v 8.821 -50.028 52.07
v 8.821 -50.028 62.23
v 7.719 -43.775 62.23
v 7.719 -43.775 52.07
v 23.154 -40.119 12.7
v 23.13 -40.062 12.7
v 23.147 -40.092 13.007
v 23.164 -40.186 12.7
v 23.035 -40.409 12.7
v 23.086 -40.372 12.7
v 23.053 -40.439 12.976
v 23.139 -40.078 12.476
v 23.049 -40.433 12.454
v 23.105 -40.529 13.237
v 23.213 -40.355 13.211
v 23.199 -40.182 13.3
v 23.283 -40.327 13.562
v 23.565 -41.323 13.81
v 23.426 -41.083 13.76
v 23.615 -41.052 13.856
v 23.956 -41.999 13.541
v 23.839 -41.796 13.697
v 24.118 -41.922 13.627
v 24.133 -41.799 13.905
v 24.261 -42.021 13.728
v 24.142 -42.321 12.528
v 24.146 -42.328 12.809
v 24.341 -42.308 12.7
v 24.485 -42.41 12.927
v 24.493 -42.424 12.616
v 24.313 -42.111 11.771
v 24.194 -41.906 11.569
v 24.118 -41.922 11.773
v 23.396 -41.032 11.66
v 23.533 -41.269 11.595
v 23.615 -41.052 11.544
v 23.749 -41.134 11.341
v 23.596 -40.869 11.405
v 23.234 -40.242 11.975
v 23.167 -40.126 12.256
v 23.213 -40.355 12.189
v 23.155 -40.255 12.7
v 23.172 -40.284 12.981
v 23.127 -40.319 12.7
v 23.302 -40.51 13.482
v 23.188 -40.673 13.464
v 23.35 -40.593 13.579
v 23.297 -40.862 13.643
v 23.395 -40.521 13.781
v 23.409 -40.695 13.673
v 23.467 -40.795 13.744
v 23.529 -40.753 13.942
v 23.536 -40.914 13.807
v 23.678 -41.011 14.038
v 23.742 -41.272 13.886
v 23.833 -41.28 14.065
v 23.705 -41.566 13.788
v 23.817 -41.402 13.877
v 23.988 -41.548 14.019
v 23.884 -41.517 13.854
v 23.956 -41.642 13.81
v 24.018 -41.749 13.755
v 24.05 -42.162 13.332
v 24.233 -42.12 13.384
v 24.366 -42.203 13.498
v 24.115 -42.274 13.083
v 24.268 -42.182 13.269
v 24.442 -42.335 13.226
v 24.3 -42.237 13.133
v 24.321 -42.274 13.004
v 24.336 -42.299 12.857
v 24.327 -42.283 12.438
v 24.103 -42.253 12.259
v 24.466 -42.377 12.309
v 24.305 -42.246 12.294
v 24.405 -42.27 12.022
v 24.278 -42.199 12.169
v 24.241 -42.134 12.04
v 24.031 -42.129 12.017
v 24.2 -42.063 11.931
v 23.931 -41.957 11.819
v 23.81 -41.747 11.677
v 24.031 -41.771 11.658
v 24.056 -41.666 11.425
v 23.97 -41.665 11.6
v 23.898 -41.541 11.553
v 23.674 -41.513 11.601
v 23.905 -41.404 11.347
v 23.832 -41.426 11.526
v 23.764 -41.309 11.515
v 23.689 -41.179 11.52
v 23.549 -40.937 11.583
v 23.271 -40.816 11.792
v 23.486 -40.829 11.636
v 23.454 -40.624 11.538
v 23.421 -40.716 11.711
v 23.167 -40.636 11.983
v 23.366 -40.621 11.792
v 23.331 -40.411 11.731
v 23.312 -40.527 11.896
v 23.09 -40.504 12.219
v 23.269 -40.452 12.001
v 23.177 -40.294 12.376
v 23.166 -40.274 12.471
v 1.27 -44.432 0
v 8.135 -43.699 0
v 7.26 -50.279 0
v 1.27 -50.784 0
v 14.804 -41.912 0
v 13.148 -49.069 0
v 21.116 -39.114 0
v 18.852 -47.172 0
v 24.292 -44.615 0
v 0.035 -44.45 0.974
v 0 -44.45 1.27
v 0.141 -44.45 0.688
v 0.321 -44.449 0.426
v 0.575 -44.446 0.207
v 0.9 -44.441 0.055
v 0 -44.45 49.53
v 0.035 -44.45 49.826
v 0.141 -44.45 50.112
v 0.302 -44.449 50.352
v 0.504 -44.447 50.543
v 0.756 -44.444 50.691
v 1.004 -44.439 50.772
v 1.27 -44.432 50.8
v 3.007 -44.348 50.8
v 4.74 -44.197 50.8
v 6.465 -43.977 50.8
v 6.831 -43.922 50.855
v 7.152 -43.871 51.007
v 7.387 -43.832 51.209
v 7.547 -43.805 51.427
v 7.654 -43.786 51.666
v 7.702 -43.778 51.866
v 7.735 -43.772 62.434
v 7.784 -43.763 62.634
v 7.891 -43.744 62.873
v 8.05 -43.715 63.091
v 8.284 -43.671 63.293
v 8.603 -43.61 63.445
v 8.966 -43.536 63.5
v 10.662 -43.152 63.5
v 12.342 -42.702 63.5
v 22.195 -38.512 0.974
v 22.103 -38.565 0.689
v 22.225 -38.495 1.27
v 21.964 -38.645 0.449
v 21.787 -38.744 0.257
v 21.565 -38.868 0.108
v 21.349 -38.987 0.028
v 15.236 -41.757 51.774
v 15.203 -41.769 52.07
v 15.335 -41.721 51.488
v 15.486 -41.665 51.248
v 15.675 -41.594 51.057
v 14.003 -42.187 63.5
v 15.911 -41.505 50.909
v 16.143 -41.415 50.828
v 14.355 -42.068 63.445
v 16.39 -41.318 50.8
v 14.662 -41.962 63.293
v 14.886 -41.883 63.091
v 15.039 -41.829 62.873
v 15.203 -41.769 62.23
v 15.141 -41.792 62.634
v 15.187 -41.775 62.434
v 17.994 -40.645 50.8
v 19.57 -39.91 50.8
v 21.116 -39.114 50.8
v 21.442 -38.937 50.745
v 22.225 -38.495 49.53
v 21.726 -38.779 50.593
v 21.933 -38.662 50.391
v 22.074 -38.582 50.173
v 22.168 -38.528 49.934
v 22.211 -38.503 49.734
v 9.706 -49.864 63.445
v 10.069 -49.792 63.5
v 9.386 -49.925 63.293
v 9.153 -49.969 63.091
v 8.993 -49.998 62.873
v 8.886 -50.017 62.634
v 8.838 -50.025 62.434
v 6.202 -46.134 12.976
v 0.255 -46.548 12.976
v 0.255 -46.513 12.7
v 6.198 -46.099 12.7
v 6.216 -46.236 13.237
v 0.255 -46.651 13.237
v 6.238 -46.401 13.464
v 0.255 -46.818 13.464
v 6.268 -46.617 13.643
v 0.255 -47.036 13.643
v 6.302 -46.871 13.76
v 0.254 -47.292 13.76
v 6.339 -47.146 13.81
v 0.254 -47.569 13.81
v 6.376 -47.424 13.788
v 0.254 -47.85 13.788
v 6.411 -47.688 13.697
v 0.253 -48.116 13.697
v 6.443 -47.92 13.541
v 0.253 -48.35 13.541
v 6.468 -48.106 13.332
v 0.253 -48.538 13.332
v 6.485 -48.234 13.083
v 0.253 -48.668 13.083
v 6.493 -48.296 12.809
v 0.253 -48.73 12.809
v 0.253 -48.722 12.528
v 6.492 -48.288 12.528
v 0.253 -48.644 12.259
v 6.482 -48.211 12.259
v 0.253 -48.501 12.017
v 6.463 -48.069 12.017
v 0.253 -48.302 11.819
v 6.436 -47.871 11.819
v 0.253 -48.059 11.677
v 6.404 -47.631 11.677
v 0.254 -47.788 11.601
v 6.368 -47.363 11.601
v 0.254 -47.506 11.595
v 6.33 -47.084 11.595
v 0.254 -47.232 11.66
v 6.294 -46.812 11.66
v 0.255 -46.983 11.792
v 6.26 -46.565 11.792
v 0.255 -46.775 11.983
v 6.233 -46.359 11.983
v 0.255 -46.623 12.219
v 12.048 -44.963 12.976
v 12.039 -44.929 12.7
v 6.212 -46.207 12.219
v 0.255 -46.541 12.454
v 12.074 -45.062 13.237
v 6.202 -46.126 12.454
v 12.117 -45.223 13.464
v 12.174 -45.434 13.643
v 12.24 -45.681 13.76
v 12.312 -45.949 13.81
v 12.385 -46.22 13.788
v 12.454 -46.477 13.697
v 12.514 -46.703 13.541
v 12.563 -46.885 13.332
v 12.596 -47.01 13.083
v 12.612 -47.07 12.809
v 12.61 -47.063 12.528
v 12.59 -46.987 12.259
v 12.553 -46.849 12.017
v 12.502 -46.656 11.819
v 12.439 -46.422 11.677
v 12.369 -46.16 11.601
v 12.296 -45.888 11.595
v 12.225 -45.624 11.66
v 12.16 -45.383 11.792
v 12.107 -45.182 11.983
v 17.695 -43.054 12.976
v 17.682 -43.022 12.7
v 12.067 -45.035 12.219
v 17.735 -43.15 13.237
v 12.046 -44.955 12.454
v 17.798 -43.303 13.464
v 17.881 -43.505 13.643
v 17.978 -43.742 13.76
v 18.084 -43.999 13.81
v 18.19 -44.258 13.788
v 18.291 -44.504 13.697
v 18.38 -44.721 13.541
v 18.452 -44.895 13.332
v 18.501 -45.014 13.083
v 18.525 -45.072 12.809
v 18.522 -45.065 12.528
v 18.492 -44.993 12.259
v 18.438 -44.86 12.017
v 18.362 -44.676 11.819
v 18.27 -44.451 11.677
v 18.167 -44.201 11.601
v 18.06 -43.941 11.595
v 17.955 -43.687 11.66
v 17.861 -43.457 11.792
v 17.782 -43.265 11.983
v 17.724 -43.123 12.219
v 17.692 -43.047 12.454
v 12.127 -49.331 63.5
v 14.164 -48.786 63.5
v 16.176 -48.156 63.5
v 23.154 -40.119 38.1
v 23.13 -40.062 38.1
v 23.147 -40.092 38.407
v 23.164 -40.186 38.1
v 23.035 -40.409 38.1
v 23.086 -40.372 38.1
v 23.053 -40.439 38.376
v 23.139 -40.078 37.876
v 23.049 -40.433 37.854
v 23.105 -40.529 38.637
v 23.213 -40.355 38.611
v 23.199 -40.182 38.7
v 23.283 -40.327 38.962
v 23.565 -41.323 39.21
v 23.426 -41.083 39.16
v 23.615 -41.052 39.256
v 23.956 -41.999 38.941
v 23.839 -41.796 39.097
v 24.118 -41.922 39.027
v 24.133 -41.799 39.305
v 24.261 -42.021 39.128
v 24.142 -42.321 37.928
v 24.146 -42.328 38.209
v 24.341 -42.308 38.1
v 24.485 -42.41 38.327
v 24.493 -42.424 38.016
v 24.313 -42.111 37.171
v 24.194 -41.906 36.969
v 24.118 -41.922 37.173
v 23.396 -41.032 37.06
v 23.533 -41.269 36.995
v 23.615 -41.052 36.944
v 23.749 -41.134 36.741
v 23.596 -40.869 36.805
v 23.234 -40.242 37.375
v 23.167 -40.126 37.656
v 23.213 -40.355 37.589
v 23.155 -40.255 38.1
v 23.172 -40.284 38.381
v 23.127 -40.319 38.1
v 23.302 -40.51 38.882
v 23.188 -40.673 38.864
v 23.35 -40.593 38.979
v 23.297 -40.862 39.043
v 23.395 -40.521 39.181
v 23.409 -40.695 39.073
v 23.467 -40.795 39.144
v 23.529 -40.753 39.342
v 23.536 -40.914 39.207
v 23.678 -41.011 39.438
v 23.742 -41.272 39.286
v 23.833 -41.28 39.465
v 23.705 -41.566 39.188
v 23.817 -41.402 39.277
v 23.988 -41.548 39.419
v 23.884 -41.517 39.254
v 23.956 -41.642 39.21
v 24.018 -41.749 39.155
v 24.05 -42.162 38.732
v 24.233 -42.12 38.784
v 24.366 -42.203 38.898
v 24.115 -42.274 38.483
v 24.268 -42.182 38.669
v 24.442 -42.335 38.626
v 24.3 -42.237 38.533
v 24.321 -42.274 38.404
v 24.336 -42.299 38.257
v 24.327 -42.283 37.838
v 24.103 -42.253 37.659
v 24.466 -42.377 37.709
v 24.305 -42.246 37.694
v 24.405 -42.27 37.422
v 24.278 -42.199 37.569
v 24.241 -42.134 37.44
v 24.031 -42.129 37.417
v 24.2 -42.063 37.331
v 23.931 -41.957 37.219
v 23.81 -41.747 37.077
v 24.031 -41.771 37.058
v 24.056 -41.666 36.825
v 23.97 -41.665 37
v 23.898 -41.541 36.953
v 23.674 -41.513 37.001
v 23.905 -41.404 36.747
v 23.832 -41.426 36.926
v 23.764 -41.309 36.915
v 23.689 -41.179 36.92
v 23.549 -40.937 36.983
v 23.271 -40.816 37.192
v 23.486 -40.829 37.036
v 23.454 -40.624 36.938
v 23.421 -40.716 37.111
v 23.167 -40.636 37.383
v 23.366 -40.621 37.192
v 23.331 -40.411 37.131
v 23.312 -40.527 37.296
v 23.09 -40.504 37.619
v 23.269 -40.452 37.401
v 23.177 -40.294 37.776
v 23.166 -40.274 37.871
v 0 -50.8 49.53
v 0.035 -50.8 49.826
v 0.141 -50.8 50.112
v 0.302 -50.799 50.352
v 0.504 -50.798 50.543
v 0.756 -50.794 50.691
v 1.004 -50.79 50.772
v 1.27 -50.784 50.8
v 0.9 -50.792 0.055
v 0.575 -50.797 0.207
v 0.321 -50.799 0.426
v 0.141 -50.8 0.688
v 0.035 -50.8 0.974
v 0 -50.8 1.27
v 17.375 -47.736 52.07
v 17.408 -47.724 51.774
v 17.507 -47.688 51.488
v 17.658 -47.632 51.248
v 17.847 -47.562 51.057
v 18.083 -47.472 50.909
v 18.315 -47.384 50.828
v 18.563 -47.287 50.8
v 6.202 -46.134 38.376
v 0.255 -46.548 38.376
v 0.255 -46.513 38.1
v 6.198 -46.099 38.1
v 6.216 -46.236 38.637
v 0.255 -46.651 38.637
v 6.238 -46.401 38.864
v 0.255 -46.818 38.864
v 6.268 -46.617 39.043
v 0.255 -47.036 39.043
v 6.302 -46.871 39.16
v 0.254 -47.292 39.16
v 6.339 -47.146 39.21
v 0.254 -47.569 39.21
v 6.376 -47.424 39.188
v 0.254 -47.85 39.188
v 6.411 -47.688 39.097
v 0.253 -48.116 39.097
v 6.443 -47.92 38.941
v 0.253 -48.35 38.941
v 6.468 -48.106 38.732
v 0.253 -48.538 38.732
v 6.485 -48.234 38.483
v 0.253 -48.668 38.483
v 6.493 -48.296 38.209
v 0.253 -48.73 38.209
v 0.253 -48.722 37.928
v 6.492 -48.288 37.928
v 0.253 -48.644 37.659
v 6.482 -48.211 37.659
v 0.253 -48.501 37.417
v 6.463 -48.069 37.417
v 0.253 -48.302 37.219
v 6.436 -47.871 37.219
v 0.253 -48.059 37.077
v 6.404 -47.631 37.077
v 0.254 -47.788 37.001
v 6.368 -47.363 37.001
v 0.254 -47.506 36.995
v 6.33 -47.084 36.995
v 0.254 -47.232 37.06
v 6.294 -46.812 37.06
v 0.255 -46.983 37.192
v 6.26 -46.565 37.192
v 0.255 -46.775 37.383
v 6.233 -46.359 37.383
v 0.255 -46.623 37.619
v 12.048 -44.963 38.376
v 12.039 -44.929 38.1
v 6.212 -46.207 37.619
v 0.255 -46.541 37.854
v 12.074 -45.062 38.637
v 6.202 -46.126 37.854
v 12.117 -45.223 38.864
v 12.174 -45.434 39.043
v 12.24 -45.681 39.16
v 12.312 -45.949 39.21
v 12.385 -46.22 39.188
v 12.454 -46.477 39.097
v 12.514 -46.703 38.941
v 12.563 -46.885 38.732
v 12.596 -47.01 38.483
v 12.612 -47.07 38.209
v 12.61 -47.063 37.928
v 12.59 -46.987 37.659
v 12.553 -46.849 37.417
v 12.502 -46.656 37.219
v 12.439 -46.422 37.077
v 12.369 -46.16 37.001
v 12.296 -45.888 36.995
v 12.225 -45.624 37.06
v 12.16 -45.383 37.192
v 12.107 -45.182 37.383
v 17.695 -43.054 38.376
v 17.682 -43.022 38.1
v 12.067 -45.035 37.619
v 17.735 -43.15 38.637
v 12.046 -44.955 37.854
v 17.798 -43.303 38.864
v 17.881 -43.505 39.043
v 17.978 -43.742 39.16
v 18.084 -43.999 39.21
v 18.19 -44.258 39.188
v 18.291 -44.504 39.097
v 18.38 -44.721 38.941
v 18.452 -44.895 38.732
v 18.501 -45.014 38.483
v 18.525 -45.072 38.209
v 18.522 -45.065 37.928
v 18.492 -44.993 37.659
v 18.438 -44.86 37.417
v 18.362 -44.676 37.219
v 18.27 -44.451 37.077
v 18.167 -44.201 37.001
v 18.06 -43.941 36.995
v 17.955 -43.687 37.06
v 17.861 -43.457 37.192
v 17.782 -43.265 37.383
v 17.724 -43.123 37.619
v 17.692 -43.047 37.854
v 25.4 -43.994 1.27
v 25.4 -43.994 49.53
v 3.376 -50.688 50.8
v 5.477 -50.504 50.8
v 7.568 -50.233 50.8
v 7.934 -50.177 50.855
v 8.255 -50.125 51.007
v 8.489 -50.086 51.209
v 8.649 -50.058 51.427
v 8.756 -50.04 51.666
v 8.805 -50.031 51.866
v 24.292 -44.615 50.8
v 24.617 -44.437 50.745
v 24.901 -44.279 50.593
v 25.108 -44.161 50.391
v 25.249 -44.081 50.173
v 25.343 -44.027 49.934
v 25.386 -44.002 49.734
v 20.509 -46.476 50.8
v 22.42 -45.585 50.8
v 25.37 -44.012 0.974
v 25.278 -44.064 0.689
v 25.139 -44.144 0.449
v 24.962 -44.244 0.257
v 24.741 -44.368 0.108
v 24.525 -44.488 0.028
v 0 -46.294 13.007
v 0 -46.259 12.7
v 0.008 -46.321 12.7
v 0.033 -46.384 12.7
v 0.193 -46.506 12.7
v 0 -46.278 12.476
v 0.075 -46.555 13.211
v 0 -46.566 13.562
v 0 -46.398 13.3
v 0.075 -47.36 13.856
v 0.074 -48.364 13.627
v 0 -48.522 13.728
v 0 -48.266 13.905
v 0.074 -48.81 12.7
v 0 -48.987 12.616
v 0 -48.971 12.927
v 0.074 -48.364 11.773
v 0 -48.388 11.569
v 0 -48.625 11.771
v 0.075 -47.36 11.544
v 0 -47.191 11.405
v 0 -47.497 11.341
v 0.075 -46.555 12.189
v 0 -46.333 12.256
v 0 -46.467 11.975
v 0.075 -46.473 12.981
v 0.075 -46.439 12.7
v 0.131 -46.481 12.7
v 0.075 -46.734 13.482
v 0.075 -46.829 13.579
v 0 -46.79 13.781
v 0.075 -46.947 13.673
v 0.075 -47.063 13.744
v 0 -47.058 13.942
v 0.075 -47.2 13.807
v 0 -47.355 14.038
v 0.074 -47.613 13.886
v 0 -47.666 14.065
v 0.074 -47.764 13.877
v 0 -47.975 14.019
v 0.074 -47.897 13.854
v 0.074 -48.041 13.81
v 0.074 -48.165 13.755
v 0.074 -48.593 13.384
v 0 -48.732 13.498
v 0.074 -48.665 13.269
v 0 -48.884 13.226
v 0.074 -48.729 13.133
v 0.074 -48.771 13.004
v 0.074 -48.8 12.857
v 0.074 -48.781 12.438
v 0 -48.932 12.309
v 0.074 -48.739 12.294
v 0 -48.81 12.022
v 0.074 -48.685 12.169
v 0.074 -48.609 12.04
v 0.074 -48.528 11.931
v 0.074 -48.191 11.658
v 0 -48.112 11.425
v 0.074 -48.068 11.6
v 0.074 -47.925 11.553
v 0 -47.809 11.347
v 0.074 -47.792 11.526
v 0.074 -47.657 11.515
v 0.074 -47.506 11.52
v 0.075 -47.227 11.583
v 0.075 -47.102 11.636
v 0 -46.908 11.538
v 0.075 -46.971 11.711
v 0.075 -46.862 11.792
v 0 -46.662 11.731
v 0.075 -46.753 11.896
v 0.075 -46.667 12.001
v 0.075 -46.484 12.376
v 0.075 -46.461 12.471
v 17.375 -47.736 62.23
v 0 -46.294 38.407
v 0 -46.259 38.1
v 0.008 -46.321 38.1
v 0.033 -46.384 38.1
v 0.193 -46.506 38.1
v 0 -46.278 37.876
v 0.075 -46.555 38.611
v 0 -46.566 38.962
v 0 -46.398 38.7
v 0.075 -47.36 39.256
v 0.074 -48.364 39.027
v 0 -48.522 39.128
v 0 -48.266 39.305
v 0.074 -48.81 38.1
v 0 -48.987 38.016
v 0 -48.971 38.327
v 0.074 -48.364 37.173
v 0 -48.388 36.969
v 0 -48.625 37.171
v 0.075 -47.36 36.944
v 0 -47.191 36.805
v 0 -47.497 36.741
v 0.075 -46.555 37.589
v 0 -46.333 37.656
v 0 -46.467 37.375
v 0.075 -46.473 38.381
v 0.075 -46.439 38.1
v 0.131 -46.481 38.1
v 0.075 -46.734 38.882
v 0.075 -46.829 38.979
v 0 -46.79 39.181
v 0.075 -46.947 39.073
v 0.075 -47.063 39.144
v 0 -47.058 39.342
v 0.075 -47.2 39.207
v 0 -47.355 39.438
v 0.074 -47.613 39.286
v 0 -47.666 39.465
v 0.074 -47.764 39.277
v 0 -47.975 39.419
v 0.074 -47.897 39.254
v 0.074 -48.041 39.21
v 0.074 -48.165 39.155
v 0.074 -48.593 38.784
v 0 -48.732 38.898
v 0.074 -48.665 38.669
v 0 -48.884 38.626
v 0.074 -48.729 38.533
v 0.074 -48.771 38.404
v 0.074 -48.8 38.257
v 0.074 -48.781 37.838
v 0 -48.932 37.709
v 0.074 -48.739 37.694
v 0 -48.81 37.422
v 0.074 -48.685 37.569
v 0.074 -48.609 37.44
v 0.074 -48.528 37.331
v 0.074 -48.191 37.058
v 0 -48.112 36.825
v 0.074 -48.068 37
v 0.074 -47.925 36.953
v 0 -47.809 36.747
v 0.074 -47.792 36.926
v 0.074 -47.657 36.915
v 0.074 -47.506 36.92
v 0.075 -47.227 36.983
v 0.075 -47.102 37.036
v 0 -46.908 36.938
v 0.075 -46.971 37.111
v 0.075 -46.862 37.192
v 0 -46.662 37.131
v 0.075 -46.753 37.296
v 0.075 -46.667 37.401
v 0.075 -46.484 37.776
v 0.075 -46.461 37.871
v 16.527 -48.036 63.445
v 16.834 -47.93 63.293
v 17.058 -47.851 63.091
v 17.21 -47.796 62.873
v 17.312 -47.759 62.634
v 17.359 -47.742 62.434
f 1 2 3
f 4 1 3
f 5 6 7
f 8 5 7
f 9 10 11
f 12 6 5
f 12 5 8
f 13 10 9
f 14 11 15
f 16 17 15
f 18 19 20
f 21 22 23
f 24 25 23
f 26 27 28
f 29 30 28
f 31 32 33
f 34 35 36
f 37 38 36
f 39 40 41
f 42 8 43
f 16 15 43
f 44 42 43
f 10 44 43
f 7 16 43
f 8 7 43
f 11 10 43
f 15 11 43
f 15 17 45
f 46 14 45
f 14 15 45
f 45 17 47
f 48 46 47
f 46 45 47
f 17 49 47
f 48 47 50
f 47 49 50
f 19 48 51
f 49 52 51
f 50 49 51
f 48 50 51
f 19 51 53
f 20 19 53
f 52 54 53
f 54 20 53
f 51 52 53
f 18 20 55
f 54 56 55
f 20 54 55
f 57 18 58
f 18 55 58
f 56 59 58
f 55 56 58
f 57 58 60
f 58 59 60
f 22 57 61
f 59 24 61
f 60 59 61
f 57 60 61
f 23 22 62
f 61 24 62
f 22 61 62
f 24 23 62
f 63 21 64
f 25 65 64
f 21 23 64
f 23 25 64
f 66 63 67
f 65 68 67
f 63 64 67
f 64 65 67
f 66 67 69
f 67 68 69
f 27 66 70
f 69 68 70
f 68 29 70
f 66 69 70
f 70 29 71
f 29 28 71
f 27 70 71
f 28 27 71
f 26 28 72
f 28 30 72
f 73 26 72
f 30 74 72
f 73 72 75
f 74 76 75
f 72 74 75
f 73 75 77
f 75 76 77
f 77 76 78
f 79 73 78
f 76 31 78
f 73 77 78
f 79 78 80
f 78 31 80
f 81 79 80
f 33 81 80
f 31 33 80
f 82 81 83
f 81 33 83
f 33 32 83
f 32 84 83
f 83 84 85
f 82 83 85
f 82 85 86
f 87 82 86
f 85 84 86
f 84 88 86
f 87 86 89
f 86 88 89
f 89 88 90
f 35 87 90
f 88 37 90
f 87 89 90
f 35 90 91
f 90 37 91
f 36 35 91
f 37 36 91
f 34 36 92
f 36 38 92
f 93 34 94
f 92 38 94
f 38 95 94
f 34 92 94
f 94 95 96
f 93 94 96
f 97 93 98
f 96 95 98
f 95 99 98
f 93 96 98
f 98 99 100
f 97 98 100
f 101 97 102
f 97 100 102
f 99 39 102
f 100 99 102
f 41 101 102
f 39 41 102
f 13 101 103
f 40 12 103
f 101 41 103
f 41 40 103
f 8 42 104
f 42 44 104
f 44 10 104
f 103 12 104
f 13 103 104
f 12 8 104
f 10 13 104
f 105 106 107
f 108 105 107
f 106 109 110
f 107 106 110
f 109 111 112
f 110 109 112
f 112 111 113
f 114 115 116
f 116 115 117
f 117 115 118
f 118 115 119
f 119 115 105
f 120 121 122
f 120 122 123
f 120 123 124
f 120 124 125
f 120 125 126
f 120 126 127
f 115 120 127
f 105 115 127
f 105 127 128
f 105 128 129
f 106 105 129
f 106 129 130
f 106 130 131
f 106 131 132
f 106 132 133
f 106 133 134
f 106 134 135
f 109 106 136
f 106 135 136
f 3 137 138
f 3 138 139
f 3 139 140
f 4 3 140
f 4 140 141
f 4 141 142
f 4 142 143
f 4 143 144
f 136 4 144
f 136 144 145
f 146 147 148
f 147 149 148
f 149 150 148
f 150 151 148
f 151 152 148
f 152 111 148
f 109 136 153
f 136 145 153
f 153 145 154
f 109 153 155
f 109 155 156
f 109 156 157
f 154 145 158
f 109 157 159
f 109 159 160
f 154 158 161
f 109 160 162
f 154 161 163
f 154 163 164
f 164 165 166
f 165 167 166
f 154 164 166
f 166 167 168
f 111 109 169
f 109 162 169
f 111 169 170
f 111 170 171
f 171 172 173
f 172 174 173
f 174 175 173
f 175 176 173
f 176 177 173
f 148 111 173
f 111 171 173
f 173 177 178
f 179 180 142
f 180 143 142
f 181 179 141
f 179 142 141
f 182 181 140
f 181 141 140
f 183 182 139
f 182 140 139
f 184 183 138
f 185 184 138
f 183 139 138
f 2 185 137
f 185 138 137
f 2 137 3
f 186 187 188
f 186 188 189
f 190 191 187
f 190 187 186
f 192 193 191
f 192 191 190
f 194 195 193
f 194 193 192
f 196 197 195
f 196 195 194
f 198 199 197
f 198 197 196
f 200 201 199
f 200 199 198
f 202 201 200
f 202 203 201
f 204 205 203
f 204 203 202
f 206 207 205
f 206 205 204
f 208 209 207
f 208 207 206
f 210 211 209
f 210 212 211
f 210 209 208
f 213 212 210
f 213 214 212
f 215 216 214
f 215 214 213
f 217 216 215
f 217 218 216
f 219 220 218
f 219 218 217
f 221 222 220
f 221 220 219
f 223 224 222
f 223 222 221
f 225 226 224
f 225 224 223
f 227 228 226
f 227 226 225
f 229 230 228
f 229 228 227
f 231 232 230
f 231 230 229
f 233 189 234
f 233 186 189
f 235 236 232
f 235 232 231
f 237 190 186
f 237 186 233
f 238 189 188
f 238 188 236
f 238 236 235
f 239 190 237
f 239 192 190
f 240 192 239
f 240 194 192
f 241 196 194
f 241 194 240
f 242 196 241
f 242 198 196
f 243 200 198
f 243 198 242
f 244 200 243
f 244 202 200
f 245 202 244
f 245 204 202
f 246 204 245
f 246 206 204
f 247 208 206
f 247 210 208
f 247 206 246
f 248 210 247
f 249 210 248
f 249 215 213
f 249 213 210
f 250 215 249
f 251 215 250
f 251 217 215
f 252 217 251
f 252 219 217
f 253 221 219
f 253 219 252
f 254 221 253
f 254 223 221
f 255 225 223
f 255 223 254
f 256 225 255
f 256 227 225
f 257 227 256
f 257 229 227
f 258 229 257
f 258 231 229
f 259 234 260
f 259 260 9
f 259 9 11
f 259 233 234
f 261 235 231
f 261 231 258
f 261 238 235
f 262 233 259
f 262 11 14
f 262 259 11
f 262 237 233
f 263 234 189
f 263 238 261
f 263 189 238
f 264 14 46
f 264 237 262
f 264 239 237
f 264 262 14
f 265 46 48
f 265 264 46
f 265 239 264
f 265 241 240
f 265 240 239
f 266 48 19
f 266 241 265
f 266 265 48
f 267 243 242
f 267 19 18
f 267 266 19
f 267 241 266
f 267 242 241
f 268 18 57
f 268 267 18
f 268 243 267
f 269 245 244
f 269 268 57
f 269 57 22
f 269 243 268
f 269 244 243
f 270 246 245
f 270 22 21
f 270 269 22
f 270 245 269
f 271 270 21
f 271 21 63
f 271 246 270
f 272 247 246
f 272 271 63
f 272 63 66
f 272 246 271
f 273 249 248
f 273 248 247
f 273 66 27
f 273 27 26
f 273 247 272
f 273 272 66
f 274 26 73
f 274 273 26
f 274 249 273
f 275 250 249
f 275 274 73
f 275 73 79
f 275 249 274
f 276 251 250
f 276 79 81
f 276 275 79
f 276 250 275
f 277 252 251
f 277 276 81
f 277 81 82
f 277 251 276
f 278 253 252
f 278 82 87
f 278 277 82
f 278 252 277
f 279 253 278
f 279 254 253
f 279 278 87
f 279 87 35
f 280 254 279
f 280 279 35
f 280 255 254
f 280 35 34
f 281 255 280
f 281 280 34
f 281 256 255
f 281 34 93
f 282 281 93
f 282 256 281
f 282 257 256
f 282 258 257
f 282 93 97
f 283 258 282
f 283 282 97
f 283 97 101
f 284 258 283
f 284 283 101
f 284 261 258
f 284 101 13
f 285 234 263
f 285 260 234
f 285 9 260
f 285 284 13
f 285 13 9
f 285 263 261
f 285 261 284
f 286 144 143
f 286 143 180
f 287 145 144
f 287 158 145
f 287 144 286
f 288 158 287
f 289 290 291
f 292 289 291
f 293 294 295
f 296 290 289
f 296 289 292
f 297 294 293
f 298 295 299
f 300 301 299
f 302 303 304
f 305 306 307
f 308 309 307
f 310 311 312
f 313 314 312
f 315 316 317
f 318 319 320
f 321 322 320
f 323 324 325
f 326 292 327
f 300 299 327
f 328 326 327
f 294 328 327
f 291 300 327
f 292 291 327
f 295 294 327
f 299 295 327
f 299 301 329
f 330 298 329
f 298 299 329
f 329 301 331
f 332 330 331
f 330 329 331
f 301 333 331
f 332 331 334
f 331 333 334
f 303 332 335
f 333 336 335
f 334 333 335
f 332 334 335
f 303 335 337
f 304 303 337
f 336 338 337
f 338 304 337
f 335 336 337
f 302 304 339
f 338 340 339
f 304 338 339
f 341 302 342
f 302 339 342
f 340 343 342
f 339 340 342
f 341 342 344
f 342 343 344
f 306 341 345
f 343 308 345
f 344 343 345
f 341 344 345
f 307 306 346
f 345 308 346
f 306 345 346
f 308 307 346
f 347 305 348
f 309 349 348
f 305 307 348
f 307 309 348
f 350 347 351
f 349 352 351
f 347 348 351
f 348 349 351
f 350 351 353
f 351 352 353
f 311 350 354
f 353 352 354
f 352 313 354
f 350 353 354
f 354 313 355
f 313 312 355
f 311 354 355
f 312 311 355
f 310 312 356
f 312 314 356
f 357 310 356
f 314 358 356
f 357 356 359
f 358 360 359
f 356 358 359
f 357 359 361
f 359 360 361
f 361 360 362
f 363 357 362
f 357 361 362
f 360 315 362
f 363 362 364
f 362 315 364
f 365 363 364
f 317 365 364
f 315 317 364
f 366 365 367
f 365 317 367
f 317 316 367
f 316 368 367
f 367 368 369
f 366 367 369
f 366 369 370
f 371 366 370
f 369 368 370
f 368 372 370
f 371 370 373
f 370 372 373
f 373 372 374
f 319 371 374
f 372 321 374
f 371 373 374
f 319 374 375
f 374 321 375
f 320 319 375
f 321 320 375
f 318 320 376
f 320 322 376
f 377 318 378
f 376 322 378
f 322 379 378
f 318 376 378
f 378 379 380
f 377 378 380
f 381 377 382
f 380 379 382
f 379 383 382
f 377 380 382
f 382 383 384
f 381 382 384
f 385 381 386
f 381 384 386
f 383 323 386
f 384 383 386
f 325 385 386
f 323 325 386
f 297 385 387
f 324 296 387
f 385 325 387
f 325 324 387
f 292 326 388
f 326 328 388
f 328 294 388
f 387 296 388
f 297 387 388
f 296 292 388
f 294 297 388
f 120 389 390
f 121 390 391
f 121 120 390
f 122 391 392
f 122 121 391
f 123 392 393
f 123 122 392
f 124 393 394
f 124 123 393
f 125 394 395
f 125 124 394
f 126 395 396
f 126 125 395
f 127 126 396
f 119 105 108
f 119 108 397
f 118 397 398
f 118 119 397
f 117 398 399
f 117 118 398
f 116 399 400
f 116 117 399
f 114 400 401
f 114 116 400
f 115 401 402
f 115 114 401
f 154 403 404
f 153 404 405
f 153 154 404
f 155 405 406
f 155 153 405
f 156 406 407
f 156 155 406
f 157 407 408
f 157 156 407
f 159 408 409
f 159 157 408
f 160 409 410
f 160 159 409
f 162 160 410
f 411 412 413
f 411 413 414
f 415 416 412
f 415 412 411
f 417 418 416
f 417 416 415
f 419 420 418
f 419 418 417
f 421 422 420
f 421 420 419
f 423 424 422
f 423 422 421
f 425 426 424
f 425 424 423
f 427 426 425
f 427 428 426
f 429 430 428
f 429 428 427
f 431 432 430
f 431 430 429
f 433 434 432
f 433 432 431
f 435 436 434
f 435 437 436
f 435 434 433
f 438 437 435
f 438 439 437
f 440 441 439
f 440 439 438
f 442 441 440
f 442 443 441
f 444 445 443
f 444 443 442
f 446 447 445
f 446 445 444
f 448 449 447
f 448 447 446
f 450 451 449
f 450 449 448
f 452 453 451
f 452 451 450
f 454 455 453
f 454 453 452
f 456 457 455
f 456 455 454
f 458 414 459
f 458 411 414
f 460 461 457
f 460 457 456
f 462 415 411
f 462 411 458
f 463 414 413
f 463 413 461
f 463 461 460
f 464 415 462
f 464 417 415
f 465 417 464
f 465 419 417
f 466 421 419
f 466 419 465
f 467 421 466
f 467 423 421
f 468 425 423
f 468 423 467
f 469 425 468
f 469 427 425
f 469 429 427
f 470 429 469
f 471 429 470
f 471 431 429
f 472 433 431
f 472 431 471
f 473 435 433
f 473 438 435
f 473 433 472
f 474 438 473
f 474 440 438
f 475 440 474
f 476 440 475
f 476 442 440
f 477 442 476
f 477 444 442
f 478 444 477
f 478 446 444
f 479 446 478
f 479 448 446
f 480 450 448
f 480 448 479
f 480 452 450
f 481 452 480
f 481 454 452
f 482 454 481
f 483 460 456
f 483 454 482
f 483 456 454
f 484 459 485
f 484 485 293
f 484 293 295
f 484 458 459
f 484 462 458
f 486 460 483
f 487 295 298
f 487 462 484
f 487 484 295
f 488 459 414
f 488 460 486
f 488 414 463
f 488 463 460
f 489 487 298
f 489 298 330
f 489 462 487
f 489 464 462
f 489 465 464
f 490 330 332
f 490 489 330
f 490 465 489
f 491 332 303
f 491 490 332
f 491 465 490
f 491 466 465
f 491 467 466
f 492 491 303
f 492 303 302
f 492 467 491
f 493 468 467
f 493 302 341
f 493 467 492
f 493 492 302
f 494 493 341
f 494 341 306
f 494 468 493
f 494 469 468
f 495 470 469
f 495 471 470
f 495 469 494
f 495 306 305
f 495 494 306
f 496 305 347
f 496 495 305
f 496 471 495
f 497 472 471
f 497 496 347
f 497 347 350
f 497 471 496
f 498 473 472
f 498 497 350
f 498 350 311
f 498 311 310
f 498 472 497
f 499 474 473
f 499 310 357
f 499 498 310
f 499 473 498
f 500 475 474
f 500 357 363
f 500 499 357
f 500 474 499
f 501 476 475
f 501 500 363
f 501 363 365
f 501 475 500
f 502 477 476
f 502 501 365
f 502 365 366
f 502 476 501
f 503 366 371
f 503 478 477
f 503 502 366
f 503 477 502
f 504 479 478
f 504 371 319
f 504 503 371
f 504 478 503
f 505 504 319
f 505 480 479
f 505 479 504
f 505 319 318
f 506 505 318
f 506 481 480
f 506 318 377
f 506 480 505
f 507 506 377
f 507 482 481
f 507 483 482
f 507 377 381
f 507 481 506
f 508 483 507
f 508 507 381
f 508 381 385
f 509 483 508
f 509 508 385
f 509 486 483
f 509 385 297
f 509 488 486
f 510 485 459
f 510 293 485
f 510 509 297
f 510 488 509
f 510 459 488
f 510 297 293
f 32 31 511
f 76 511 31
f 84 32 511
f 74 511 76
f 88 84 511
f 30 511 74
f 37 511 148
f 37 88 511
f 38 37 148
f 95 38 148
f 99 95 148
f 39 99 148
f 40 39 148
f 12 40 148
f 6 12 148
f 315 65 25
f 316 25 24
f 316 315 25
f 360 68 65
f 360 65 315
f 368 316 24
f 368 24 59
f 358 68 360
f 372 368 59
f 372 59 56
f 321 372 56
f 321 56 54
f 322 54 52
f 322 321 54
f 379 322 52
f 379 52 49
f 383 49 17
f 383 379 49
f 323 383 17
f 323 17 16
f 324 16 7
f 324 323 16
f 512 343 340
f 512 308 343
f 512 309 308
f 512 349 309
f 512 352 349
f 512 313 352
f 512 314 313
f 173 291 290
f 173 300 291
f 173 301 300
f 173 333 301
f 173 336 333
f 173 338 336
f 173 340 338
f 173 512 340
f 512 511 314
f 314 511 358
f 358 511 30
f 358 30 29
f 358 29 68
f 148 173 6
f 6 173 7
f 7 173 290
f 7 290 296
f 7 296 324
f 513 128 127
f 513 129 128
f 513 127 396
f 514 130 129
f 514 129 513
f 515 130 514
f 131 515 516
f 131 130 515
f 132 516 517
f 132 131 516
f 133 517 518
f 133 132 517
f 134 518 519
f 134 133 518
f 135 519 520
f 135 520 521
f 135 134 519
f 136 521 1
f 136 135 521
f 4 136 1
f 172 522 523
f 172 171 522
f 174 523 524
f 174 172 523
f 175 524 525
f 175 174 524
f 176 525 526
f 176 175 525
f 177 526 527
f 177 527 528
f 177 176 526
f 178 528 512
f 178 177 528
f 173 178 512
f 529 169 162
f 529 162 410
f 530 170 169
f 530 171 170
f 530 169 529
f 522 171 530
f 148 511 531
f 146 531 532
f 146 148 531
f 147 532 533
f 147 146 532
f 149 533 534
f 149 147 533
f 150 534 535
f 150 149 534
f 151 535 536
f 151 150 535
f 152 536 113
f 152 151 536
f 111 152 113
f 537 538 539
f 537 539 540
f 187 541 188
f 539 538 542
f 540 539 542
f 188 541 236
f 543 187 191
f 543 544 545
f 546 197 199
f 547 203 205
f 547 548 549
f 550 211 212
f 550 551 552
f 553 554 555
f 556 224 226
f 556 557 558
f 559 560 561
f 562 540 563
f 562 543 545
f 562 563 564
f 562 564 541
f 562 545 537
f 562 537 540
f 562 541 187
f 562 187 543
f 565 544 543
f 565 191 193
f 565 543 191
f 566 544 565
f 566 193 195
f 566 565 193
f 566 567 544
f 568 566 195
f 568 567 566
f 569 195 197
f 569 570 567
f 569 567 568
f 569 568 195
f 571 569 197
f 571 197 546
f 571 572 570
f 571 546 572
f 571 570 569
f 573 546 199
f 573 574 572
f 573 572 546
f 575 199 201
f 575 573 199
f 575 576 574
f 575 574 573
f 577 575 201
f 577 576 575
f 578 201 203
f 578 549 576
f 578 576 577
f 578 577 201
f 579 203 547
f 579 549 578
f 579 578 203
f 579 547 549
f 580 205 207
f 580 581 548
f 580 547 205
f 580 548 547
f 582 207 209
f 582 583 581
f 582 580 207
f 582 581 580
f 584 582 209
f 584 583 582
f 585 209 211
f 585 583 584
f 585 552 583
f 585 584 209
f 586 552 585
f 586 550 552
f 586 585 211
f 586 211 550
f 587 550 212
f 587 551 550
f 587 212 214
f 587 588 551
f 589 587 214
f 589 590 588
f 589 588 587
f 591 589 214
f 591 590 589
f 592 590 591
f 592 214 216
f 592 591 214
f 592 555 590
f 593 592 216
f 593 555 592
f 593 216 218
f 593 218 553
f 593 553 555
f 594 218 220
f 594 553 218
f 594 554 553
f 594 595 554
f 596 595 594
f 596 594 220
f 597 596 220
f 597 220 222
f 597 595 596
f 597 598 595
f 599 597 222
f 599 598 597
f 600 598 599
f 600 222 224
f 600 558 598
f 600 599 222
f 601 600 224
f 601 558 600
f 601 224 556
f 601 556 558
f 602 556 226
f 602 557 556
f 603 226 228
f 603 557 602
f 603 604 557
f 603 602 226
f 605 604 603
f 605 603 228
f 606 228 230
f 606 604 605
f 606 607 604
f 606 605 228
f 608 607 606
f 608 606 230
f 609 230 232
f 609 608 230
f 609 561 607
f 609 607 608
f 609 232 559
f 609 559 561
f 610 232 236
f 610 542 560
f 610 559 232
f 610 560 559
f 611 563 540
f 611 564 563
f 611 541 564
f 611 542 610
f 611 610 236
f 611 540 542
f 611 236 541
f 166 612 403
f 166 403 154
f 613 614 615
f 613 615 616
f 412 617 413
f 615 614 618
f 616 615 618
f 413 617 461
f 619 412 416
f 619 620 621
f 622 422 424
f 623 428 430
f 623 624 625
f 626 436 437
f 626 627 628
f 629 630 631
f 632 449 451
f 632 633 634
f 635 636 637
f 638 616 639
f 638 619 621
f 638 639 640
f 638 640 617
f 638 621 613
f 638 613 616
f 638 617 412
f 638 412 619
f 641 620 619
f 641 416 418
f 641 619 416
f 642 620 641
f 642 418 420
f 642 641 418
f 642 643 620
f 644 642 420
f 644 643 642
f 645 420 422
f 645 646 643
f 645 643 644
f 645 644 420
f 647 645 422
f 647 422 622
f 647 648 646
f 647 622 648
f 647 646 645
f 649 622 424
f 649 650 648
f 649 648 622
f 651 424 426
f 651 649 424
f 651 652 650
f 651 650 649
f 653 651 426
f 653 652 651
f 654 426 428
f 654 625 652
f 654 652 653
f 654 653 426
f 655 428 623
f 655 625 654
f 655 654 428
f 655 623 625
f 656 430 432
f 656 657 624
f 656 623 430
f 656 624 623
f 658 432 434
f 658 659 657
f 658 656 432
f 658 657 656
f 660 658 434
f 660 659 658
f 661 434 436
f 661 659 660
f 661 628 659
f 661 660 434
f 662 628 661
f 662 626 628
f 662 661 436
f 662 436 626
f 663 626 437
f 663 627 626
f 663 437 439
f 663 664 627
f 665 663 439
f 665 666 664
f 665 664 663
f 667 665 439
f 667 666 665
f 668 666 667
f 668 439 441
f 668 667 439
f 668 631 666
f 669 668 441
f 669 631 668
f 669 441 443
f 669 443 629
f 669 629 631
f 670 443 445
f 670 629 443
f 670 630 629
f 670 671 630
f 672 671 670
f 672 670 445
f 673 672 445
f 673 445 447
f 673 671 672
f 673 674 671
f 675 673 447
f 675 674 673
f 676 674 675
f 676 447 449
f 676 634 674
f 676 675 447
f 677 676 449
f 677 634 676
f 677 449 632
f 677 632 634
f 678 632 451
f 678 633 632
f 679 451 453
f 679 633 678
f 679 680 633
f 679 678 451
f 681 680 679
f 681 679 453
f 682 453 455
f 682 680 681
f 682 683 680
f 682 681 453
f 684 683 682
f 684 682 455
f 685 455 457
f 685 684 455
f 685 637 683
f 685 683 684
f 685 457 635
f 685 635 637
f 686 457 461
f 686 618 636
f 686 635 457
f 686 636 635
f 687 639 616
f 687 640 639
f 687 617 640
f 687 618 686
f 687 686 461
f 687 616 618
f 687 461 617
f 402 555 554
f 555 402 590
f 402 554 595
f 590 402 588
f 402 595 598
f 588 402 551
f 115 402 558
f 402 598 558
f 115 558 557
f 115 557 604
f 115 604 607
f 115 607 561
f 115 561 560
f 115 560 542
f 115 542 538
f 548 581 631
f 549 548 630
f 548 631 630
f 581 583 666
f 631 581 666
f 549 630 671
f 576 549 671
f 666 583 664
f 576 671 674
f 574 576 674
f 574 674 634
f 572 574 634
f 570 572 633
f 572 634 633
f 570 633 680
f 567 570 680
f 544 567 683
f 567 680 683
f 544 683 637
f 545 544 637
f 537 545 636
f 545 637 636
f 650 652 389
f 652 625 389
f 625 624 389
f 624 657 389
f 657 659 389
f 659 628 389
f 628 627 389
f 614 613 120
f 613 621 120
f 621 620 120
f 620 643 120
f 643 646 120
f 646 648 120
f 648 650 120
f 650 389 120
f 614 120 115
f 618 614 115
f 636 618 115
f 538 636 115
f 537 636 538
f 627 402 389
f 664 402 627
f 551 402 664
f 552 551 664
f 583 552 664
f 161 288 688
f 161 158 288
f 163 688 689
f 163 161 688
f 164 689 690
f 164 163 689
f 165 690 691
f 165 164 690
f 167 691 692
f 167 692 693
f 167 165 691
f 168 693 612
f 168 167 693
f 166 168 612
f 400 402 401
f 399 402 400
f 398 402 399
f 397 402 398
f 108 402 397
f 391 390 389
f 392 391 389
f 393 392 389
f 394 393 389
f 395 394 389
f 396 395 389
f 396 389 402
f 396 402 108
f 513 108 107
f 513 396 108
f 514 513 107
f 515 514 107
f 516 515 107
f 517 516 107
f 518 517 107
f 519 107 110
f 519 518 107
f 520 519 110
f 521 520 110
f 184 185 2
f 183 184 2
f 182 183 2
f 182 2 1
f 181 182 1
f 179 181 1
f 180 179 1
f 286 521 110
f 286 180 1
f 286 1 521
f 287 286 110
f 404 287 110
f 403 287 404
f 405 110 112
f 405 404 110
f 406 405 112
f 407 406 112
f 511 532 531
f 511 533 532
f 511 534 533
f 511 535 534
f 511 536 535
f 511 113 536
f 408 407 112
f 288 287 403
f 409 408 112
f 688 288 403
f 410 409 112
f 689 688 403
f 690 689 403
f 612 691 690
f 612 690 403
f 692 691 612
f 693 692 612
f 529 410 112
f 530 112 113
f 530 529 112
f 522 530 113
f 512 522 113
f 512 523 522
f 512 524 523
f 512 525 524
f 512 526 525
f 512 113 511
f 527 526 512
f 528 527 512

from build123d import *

# Parameters (mm, degrees)
F0_W     = 6.35
F0_H     = 50.8
F2_ANGLE = 30
F3_W     = 6.35
F3_H     = 12.7
F4_ANGLE = 20
F5_ANGLE = 10
F6_R     = 1.27
F7_R     = 1.11125
F9_R     = 0.254


with BuildPart() as f2:
    # F0 (on Right) → F2 (revolve)
    with BuildSketch(Plane.YZ):
        with Locations((-47.625, 25.4)):
            Rectangle(F0_W, F0_H)
    revolve(axis=Axis((0, 0, 29.2990189046), (0, 0, 1)), revolution_arc=F2_ANGLE)

    # F3 (on Right) → F4 (revolve)
    with BuildSketch(Plane.YZ):
        with Locations((-47.625, 57.15)):
            Rectangle(F3_W, F3_H)
    revolve(axis=Axis((0, 0, 29.2990189046), (0, 0, 1)), revolution_arc=F4_ANGLE)

    # F3 (on Right) → F5 (revolve, cut)
    with BuildSketch(Plane.YZ):
        with Locations((-47.625, 57.15)):
            Rectangle(F3_W, F3_H)
    revolve(axis=Axis((0, 0, 29.2990189046), (0, 0, 1)), revolution_arc=F5_ANGLE, mode=Mode.SUBTRACT)

    # F6
    f6_edges = [f2.edges().sort_by_distance(p)[0] for p in [
        (16.288709, -44.752861, 63.5),
        (8.269994, -46.901469, 63.5),
        (23.8125, -41.24446, 50.8),
        (8.269994, -46.901469, 50.8),
        (0, -47.625, 0),
        (23.8125, -41.24446, 0),
        (16.288709, -44.752861, 50.8),
        (0, -47.625, 50.8),
    ]]
    fillet(f6_edges, radius=F6_R)

    # F7 (on Right) → F8 (revolve, cut)
    with BuildSketch(Plane.YZ):
        with Locations((-47.625, 38.1)):
            Circle(F7_R)
        with Locations((-47.625, 12.7)):
            Circle(F7_R)
    revolve(axis=Axis((0, 0, 29.2990189046), (0, 0, 1)), mode=Mode.SUBTRACT)

    # F9
    f9_edges = [f2.edges().sort_by_distance(p)[0] for p in [
        (24.368125, -42.206831, 38.1),
        (24.368125, -42.206831, 12.7),
        (0, -48.73625, 38.1),
        (0, -48.73625, 12.7),
    ]]
    fillet(f9_edges, radius=F9_R)


solid = f2.part
